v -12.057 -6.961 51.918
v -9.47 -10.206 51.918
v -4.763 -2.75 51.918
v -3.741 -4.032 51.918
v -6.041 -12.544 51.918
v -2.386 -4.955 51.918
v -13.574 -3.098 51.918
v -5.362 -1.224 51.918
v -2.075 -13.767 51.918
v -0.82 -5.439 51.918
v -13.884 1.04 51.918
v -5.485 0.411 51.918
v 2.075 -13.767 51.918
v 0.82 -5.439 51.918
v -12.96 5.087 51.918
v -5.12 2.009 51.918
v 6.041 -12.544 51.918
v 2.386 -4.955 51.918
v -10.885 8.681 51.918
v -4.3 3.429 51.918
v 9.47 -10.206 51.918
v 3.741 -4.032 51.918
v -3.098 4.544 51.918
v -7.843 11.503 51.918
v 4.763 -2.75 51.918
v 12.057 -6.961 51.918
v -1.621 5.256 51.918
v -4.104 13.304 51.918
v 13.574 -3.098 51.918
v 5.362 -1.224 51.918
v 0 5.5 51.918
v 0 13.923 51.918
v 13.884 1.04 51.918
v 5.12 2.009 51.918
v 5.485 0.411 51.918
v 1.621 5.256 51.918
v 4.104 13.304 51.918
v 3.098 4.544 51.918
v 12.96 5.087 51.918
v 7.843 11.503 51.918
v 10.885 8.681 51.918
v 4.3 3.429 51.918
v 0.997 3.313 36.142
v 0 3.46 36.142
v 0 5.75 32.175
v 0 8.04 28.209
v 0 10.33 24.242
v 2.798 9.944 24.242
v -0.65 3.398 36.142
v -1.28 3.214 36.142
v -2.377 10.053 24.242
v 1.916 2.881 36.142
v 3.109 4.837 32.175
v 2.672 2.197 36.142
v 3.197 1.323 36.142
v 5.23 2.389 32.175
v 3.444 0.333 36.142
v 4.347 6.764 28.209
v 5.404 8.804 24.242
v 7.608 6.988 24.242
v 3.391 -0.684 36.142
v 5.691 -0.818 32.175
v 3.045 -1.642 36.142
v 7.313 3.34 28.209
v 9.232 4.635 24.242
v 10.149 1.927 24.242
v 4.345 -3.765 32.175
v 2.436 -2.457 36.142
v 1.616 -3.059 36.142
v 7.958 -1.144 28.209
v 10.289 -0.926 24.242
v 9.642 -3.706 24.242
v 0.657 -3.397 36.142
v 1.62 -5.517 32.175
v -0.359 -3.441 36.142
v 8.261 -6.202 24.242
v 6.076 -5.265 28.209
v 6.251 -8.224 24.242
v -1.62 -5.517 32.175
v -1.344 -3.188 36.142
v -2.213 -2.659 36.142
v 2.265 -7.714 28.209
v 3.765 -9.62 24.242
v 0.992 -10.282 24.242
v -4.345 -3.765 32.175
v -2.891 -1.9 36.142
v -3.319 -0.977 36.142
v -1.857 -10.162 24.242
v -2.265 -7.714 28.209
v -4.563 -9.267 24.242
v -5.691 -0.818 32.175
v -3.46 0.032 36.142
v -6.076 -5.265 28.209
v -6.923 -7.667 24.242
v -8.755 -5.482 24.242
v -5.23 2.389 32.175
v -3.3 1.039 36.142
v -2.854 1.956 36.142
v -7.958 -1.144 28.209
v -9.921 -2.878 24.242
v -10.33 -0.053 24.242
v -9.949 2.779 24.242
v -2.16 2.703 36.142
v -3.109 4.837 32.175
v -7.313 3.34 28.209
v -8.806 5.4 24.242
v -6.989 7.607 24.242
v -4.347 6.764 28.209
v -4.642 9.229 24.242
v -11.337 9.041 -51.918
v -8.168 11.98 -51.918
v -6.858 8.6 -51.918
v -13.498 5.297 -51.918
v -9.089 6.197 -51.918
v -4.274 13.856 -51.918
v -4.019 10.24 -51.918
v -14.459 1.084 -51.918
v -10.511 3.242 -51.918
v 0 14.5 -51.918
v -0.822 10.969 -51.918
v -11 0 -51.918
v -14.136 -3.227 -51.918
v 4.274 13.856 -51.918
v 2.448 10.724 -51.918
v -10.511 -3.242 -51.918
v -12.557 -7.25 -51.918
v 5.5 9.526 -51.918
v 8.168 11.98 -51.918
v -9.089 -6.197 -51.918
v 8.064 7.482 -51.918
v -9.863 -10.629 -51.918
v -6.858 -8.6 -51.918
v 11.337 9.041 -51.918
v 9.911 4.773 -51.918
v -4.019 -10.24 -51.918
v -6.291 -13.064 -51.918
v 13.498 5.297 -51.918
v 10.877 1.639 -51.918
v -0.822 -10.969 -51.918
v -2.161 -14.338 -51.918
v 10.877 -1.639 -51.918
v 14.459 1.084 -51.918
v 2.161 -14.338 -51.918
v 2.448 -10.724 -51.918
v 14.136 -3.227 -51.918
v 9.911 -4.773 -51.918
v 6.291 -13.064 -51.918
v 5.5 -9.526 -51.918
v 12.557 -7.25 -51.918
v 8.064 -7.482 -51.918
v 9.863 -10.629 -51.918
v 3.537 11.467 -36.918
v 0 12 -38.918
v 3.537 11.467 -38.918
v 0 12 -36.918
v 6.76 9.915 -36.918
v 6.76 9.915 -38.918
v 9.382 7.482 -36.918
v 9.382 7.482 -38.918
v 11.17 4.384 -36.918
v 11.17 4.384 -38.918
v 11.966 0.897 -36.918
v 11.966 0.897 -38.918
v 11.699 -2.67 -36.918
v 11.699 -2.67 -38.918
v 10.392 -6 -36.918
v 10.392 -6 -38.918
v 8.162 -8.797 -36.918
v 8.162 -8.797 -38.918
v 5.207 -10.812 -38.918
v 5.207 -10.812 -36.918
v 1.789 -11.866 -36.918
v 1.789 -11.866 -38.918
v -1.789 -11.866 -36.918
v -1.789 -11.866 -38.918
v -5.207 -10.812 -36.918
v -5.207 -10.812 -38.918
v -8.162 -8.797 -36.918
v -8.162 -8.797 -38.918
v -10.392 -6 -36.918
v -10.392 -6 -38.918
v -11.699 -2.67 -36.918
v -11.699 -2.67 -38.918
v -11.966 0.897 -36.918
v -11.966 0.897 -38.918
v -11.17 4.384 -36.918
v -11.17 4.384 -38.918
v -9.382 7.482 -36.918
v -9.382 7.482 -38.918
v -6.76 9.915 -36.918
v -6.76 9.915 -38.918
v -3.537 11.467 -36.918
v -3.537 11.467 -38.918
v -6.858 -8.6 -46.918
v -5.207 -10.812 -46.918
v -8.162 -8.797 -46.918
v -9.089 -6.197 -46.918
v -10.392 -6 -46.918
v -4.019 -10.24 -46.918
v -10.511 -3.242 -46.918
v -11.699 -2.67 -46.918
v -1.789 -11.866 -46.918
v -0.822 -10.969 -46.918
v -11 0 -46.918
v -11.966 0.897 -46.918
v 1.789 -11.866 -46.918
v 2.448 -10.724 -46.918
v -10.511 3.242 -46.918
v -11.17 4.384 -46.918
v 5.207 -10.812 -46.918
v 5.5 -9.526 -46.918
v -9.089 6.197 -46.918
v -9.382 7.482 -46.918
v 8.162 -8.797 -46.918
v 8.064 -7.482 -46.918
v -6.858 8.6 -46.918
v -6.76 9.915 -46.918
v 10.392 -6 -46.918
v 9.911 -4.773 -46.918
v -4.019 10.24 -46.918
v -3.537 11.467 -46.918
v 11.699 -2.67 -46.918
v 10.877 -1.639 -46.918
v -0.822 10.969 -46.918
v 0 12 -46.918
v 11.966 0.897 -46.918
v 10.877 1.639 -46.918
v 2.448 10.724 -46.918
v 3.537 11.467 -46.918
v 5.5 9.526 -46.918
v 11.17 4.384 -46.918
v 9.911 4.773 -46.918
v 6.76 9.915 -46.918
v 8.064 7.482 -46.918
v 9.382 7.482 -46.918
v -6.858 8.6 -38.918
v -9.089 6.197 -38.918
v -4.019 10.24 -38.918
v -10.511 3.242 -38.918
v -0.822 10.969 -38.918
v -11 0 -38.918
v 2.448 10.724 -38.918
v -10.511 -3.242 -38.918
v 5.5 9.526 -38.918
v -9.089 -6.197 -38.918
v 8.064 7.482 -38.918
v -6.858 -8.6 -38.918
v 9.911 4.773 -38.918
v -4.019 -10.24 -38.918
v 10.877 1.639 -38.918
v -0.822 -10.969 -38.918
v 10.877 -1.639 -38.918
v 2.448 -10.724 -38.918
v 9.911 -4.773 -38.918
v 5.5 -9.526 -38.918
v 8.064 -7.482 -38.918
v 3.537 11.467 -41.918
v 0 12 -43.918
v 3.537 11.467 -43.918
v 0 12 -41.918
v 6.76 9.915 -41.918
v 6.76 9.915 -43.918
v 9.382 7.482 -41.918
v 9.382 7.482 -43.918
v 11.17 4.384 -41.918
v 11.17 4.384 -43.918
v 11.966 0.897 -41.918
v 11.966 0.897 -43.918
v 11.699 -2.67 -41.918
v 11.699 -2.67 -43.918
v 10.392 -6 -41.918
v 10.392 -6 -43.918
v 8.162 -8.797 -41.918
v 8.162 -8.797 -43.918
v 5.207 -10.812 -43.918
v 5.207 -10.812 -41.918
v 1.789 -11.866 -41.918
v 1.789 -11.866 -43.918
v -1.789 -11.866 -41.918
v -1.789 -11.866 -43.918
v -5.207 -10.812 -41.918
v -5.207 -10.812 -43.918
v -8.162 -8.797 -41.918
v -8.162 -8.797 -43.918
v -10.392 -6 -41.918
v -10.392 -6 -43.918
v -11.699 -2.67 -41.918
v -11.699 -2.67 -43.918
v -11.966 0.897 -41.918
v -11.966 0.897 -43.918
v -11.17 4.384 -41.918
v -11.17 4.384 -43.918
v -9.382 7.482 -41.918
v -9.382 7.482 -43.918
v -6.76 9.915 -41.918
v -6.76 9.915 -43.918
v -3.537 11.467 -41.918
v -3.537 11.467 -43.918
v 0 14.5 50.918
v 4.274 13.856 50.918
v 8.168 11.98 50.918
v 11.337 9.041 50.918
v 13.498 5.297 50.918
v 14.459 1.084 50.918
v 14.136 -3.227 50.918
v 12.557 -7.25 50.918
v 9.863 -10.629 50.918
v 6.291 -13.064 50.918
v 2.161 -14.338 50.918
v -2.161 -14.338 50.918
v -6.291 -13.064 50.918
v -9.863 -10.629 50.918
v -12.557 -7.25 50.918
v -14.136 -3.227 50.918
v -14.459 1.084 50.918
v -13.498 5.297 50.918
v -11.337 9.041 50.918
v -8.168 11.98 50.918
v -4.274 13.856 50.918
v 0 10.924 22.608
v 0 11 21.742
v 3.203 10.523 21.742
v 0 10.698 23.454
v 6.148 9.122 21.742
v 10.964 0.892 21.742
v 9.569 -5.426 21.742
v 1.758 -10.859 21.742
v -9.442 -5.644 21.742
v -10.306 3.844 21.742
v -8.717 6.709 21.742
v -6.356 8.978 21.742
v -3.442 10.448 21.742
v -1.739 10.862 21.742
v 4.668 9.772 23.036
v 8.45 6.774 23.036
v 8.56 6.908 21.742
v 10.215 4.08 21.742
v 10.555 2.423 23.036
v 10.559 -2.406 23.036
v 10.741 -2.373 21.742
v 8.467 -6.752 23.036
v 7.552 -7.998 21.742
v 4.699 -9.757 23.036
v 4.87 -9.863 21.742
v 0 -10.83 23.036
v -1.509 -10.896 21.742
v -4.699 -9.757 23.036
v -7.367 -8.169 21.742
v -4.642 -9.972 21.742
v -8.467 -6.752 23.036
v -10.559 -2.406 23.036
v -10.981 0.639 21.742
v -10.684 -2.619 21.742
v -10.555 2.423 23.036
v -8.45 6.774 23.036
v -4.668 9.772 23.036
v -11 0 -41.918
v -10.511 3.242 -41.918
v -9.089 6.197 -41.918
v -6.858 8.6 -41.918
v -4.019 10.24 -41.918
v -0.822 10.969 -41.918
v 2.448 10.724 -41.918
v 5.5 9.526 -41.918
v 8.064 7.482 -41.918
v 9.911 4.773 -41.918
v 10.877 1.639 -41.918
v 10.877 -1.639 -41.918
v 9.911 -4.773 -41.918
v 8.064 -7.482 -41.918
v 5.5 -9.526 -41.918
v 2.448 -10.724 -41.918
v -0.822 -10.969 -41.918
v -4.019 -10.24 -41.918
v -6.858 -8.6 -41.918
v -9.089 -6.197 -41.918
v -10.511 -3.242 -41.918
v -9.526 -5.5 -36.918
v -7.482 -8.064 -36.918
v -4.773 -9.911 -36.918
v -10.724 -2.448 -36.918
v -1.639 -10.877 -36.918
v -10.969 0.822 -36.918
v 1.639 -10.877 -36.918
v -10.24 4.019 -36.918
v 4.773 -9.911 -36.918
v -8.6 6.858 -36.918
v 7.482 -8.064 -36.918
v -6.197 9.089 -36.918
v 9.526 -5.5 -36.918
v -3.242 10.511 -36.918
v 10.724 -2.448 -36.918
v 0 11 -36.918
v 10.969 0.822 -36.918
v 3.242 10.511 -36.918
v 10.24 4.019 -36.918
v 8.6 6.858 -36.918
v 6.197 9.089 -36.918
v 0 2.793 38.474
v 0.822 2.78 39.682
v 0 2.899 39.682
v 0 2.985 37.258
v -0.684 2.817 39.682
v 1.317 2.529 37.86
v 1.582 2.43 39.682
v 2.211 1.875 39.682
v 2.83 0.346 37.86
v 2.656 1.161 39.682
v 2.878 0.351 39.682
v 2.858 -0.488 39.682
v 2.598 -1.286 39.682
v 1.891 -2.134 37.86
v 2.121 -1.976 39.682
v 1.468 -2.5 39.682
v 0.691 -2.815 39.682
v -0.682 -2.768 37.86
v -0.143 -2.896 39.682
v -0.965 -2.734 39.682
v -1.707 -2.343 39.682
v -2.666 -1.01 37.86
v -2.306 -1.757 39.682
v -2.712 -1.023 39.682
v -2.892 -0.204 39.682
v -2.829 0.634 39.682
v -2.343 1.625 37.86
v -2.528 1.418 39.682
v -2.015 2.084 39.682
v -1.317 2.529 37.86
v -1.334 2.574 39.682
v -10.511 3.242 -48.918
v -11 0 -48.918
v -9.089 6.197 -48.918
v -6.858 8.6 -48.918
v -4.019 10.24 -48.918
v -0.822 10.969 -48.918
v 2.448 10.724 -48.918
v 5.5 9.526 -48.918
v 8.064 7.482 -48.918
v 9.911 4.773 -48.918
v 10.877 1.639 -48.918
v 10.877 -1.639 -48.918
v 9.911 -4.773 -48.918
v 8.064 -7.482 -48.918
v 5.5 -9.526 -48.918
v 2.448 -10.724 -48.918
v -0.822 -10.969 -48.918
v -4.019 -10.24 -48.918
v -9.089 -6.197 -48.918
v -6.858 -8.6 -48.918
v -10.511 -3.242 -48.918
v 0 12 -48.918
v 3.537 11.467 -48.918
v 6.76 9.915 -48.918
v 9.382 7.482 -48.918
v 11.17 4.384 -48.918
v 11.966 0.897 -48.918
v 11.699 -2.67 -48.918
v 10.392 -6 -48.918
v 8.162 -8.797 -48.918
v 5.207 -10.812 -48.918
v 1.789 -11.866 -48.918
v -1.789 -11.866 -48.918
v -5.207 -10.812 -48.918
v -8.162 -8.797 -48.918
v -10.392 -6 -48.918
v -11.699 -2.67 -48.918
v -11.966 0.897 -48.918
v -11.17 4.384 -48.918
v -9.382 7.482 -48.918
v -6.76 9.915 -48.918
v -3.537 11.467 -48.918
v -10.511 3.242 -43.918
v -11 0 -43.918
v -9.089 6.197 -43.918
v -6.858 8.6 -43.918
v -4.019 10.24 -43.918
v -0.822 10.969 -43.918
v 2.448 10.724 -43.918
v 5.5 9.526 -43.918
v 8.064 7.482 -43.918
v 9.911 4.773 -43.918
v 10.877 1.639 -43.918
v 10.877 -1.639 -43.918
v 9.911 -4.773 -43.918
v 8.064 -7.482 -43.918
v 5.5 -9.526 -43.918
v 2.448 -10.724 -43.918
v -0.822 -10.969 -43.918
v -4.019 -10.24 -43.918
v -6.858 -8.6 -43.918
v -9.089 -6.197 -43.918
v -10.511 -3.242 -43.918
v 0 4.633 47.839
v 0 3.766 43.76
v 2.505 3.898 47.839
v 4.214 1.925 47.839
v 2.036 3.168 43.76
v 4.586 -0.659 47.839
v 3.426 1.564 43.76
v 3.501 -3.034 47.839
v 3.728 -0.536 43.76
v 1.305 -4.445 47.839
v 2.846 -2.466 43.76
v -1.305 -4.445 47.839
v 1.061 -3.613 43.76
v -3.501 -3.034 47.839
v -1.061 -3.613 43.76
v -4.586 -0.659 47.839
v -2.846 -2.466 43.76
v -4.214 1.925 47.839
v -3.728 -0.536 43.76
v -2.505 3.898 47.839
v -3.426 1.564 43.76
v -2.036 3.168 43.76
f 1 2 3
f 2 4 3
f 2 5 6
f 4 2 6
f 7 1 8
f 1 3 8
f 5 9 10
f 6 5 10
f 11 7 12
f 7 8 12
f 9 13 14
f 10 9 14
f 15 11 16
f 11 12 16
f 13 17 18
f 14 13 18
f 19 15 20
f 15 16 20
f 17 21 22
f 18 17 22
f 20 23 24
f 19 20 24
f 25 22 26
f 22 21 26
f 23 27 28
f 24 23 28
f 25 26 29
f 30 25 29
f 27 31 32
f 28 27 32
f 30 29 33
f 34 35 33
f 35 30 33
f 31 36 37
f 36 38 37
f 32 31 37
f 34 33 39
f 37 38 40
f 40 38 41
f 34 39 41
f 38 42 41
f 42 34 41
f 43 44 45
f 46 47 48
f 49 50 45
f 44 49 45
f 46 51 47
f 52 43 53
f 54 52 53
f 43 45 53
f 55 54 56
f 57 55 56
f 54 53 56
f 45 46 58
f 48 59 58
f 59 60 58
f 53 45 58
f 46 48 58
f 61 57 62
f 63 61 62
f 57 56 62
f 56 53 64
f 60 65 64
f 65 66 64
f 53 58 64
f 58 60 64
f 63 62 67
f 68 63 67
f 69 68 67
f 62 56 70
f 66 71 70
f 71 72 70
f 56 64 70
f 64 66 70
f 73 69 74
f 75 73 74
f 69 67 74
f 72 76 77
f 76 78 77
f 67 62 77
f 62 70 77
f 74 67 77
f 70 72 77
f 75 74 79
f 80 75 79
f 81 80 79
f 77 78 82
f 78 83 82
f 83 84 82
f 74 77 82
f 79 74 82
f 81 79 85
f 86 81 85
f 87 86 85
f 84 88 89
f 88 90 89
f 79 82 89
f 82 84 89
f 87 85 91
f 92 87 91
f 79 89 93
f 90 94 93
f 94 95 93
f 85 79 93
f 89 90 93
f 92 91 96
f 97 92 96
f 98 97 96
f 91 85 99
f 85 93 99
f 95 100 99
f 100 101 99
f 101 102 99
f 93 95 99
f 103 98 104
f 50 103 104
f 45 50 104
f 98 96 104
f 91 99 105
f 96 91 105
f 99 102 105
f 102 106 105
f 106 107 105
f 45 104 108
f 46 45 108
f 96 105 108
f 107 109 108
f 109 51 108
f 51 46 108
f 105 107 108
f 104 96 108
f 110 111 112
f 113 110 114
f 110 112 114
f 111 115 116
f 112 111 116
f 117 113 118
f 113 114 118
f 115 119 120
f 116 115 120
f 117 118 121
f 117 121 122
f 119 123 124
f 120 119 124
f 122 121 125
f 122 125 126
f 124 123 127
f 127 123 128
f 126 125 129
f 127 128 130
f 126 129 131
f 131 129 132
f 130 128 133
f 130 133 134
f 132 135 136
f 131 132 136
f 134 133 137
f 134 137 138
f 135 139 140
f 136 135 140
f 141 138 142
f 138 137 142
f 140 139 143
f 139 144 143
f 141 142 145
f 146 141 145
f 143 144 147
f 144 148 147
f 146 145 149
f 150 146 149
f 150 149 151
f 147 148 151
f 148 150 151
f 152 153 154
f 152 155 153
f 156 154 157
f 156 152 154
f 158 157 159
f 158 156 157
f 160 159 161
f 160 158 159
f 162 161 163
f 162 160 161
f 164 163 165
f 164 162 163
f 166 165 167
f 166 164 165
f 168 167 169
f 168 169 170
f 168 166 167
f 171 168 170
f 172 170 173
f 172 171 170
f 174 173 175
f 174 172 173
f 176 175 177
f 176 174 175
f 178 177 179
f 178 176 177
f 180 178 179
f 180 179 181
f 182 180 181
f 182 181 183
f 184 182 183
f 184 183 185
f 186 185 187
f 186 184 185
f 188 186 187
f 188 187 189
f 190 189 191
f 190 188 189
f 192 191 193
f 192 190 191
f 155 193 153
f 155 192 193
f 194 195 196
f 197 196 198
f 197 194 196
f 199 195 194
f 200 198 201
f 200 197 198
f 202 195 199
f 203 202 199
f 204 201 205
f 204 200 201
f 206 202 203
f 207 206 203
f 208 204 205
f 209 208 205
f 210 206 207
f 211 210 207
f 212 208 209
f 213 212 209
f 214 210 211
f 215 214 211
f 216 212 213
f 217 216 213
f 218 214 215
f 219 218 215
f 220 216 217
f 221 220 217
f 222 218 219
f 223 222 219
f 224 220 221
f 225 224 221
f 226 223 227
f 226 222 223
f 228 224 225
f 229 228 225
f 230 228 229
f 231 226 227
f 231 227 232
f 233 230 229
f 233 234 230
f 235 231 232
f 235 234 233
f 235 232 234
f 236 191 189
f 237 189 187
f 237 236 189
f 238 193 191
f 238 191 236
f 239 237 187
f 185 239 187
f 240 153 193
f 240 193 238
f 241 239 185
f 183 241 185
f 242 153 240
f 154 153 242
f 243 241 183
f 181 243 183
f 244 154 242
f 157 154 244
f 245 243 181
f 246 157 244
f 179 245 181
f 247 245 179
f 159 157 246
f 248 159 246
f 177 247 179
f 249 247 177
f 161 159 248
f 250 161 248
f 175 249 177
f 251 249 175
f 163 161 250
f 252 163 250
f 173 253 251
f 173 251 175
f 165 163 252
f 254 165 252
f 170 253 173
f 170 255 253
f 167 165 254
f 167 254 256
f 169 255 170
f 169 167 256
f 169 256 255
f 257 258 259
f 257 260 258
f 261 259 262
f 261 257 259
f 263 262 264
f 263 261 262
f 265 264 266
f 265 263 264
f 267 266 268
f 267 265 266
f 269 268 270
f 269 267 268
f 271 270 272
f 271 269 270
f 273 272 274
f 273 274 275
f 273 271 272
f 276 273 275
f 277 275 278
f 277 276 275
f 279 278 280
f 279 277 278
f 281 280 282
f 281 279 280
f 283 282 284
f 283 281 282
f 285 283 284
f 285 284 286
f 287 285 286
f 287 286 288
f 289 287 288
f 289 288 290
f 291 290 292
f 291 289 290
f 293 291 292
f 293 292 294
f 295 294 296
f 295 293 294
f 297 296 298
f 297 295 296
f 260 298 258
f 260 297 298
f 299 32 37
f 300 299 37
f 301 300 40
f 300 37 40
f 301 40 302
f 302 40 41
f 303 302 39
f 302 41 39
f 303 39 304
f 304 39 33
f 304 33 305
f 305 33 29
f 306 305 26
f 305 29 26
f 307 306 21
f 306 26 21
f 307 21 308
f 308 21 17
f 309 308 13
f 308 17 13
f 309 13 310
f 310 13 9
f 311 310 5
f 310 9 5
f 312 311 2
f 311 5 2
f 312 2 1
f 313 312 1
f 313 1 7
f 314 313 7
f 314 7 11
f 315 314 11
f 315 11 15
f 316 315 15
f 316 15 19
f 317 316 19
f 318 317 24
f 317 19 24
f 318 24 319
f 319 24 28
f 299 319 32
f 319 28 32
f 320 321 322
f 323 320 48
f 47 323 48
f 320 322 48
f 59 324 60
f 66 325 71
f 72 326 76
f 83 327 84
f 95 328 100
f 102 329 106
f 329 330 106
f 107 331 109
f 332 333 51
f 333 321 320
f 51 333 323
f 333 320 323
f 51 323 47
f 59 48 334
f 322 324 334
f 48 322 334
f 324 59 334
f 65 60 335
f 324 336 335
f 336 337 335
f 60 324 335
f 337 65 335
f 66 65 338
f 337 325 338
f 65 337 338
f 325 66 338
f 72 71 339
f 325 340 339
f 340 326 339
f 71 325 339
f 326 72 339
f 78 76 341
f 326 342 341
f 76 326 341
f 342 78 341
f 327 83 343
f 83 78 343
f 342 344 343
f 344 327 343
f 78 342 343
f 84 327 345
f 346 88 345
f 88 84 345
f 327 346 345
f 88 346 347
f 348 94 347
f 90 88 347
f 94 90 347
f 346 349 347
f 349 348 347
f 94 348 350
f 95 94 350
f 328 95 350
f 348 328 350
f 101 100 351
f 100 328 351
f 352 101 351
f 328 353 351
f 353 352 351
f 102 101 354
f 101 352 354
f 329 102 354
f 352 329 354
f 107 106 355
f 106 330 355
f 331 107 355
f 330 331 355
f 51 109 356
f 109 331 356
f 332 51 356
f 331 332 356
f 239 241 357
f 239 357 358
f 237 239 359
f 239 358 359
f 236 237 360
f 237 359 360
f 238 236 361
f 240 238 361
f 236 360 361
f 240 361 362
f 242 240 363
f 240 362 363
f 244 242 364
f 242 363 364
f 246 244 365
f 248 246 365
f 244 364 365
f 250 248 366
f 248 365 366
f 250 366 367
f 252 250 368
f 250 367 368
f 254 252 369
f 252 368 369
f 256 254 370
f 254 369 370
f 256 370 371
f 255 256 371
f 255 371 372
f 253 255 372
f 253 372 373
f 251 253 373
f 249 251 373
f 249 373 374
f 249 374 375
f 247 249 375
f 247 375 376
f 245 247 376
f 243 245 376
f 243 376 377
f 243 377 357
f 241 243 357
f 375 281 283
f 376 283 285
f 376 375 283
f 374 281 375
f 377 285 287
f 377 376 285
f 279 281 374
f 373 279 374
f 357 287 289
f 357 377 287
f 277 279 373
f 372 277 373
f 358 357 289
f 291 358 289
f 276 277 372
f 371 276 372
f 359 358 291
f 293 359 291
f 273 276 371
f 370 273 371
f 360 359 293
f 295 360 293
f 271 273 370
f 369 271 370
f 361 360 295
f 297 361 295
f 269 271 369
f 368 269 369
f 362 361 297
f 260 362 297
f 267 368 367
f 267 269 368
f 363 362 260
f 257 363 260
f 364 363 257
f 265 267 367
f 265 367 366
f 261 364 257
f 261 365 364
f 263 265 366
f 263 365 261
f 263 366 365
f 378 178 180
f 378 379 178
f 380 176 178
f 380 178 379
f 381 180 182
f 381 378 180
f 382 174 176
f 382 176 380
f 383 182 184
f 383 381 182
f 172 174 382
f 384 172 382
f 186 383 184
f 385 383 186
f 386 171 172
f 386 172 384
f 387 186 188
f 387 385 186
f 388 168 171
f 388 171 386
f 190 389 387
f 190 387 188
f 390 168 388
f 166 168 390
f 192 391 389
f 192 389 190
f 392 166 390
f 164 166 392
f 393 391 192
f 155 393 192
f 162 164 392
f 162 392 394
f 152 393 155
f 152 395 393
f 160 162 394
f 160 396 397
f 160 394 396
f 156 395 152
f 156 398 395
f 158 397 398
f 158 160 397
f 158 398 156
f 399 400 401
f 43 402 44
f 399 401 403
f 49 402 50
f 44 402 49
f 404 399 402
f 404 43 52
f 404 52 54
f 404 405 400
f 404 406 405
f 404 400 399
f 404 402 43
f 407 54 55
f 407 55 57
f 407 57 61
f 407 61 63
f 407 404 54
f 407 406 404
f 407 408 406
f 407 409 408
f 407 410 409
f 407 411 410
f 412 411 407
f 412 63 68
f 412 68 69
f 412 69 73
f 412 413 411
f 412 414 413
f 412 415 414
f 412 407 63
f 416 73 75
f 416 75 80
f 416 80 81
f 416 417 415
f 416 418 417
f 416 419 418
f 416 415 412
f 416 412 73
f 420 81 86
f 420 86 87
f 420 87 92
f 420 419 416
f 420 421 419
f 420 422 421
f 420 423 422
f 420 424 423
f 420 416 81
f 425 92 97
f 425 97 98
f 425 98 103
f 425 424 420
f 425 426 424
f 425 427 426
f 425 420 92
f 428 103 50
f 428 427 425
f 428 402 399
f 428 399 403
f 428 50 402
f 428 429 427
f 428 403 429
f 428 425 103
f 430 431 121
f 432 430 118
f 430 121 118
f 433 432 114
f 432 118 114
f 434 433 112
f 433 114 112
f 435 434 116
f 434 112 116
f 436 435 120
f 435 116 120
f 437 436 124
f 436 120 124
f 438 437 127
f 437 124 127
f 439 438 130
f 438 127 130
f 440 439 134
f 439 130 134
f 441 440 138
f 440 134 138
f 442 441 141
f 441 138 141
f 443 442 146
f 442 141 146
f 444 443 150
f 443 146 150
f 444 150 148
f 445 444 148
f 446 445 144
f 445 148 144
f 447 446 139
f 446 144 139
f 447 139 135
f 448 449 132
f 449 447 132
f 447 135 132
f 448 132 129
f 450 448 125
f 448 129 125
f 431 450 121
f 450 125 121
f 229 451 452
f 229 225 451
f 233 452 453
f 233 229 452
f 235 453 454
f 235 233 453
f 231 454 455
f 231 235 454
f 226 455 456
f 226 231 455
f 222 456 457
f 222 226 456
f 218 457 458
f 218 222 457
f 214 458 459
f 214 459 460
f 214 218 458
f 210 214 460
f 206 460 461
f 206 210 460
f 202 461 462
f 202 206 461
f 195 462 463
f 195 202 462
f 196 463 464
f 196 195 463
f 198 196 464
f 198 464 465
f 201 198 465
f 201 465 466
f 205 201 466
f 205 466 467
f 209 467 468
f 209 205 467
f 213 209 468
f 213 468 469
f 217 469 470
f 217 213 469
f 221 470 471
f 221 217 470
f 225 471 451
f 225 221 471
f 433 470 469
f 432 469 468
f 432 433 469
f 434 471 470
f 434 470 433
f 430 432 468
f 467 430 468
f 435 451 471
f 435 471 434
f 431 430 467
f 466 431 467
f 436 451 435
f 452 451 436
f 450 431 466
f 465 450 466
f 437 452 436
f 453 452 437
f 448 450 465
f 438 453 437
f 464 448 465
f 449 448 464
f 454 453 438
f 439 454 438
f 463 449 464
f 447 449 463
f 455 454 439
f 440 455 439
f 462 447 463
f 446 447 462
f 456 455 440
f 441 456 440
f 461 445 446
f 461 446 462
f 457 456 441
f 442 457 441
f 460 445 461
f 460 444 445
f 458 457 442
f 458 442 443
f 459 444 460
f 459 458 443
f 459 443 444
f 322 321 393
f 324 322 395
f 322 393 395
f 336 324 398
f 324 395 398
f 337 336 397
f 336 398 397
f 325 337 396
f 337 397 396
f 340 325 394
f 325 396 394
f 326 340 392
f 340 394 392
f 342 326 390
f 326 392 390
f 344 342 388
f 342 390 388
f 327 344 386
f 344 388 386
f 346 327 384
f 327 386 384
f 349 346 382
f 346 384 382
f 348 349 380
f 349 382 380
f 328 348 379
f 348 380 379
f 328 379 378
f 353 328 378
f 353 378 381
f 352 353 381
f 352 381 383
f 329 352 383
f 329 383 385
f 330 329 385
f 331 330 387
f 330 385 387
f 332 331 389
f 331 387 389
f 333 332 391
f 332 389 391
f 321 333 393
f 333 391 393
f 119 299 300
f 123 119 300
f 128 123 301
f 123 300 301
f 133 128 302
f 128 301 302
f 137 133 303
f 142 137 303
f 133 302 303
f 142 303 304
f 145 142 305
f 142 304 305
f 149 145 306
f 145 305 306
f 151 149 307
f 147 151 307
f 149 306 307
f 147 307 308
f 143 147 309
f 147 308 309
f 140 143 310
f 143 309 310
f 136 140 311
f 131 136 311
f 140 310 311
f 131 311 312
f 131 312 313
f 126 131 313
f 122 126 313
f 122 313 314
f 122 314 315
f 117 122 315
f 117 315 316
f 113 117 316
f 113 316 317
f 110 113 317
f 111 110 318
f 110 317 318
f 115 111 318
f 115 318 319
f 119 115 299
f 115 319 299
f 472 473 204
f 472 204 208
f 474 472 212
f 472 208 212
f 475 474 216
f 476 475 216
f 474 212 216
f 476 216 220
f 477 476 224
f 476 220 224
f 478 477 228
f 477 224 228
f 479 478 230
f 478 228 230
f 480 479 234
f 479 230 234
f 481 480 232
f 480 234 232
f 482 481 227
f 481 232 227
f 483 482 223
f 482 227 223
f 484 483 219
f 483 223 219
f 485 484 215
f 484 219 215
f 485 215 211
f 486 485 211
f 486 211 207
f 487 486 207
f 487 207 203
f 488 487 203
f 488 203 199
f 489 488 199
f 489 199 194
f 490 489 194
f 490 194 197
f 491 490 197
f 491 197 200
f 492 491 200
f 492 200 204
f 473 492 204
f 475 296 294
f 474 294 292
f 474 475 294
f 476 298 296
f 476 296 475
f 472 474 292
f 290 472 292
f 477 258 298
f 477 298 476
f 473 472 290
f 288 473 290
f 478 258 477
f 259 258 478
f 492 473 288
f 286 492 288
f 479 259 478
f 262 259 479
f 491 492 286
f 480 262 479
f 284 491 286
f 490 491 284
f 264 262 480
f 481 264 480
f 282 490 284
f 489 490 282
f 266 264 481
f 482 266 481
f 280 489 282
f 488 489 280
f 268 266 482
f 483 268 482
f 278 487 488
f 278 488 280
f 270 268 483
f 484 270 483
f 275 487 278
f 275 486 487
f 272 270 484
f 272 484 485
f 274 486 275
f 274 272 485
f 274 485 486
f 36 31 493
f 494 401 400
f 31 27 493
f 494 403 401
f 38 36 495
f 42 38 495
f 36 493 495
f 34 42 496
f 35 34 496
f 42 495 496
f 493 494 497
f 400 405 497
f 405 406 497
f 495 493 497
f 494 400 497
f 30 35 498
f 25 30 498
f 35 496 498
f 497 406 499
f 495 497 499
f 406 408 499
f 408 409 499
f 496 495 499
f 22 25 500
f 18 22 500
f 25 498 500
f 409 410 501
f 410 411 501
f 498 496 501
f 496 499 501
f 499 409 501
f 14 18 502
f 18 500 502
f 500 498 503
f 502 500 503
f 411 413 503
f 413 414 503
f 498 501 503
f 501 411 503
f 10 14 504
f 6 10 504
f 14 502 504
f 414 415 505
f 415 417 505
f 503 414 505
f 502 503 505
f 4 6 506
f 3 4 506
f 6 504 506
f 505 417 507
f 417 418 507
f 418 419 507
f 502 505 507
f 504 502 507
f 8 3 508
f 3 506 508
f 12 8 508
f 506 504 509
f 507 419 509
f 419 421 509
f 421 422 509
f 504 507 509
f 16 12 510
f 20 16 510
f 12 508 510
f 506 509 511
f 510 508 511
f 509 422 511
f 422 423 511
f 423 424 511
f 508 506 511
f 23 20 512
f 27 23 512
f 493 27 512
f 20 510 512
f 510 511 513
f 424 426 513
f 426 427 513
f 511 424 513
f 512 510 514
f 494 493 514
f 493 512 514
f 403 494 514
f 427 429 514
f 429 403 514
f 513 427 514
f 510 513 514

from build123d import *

# Parameters (mm, degrees)
ESQUISSE2_R             = 11
ENL_V_MAT_EXTRU_1_DEPTH = 15
CONG_1_R                = 5
CHANFREIN1_SIZE         = 1
CHANFREIN1_SIZE2        = 0.577350269


with BuildPart() as part:
    # Esquisse1 → Révolution1 (revolve)
    with BuildSketch(Plane(origin=(0, 0, 0), x_dir=(0, 0, -1), z_dir=(1, 0, 0))):
        Polygon((36.918161096, 11), (36.918161096, 9), (51.918161096, 9), (51.918161096, 14.5), (-51.918161096, 14.5), (-51.918161096, 5.5), (-37.804270768, 2.5), (-23.081838904, 11), align=None)
    revolve(axis=Axis((0, 0, 51.918161096), (0, 0, -1)))

    # Esquisse2 → Enlèv. mat.-Extru.1 (cut)
    with BuildSketch(Plane(origin=(0, 0, -51.918161096), x_dir=(-1, 0, 0), z_dir=(0, 0, -1))):
        Circle(ESQUISSE2_R)
    extrude(amount=-ENL_V_MAT_EXTRU_1_DEPTH, mode=Mode.SUBTRACT)

    # Esquisse3 → Enlèvement de matière-Révolution1 (revolve, cut)
    with BuildSketch(Plane(origin=(0, 0, 0), x_dir=(0, 0, -1), z_dir=(1, 0, 0))):
        Polygon((48.918161096, 11), (48.918161096, 12), (46.918161096, 12), (46.918161096, 11), (43.918161096, 11), (43.918161096, 12), (41.918161096, 12), (41.918161096, 11), (38.918161096, 11), (38.918161096, 12), (36.918161096, 12), (36.918161096, 11), (36.918161096, 0), (51.918161096, 0), (51.918161096, 11), align=None)
    revolve(axis=Axis((0, 0, 0), (0, 0, -1)), mode=Mode.SUBTRACT)

    # Congé1
    cong_1_edges = [part.edges().sort_by_distance(p)[0] for p in [
        (0, -11, 23.081838904),
        (0, -2.5, 37.804270768),
    ]]
    fillet(cong_1_edges, radius=CONG_1_R)

    # Chanfrein1
    chanfrein1_edges = [part.edges().sort_by_distance(p)[0] for p in [
        (0, -14.5, 51.918161096),
    ]]
    chanfrein1_side = [part.faces().sort_by_distance(p)[0] for p in [
        (0, -14.5, 0),
    ]]
    chamfer(chanfrein1_edges, length=CHANFREIN1_SIZE, length2=CHANFREIN1_SIZE2, reference=chanfrein1_side[0])


solid = part.part
